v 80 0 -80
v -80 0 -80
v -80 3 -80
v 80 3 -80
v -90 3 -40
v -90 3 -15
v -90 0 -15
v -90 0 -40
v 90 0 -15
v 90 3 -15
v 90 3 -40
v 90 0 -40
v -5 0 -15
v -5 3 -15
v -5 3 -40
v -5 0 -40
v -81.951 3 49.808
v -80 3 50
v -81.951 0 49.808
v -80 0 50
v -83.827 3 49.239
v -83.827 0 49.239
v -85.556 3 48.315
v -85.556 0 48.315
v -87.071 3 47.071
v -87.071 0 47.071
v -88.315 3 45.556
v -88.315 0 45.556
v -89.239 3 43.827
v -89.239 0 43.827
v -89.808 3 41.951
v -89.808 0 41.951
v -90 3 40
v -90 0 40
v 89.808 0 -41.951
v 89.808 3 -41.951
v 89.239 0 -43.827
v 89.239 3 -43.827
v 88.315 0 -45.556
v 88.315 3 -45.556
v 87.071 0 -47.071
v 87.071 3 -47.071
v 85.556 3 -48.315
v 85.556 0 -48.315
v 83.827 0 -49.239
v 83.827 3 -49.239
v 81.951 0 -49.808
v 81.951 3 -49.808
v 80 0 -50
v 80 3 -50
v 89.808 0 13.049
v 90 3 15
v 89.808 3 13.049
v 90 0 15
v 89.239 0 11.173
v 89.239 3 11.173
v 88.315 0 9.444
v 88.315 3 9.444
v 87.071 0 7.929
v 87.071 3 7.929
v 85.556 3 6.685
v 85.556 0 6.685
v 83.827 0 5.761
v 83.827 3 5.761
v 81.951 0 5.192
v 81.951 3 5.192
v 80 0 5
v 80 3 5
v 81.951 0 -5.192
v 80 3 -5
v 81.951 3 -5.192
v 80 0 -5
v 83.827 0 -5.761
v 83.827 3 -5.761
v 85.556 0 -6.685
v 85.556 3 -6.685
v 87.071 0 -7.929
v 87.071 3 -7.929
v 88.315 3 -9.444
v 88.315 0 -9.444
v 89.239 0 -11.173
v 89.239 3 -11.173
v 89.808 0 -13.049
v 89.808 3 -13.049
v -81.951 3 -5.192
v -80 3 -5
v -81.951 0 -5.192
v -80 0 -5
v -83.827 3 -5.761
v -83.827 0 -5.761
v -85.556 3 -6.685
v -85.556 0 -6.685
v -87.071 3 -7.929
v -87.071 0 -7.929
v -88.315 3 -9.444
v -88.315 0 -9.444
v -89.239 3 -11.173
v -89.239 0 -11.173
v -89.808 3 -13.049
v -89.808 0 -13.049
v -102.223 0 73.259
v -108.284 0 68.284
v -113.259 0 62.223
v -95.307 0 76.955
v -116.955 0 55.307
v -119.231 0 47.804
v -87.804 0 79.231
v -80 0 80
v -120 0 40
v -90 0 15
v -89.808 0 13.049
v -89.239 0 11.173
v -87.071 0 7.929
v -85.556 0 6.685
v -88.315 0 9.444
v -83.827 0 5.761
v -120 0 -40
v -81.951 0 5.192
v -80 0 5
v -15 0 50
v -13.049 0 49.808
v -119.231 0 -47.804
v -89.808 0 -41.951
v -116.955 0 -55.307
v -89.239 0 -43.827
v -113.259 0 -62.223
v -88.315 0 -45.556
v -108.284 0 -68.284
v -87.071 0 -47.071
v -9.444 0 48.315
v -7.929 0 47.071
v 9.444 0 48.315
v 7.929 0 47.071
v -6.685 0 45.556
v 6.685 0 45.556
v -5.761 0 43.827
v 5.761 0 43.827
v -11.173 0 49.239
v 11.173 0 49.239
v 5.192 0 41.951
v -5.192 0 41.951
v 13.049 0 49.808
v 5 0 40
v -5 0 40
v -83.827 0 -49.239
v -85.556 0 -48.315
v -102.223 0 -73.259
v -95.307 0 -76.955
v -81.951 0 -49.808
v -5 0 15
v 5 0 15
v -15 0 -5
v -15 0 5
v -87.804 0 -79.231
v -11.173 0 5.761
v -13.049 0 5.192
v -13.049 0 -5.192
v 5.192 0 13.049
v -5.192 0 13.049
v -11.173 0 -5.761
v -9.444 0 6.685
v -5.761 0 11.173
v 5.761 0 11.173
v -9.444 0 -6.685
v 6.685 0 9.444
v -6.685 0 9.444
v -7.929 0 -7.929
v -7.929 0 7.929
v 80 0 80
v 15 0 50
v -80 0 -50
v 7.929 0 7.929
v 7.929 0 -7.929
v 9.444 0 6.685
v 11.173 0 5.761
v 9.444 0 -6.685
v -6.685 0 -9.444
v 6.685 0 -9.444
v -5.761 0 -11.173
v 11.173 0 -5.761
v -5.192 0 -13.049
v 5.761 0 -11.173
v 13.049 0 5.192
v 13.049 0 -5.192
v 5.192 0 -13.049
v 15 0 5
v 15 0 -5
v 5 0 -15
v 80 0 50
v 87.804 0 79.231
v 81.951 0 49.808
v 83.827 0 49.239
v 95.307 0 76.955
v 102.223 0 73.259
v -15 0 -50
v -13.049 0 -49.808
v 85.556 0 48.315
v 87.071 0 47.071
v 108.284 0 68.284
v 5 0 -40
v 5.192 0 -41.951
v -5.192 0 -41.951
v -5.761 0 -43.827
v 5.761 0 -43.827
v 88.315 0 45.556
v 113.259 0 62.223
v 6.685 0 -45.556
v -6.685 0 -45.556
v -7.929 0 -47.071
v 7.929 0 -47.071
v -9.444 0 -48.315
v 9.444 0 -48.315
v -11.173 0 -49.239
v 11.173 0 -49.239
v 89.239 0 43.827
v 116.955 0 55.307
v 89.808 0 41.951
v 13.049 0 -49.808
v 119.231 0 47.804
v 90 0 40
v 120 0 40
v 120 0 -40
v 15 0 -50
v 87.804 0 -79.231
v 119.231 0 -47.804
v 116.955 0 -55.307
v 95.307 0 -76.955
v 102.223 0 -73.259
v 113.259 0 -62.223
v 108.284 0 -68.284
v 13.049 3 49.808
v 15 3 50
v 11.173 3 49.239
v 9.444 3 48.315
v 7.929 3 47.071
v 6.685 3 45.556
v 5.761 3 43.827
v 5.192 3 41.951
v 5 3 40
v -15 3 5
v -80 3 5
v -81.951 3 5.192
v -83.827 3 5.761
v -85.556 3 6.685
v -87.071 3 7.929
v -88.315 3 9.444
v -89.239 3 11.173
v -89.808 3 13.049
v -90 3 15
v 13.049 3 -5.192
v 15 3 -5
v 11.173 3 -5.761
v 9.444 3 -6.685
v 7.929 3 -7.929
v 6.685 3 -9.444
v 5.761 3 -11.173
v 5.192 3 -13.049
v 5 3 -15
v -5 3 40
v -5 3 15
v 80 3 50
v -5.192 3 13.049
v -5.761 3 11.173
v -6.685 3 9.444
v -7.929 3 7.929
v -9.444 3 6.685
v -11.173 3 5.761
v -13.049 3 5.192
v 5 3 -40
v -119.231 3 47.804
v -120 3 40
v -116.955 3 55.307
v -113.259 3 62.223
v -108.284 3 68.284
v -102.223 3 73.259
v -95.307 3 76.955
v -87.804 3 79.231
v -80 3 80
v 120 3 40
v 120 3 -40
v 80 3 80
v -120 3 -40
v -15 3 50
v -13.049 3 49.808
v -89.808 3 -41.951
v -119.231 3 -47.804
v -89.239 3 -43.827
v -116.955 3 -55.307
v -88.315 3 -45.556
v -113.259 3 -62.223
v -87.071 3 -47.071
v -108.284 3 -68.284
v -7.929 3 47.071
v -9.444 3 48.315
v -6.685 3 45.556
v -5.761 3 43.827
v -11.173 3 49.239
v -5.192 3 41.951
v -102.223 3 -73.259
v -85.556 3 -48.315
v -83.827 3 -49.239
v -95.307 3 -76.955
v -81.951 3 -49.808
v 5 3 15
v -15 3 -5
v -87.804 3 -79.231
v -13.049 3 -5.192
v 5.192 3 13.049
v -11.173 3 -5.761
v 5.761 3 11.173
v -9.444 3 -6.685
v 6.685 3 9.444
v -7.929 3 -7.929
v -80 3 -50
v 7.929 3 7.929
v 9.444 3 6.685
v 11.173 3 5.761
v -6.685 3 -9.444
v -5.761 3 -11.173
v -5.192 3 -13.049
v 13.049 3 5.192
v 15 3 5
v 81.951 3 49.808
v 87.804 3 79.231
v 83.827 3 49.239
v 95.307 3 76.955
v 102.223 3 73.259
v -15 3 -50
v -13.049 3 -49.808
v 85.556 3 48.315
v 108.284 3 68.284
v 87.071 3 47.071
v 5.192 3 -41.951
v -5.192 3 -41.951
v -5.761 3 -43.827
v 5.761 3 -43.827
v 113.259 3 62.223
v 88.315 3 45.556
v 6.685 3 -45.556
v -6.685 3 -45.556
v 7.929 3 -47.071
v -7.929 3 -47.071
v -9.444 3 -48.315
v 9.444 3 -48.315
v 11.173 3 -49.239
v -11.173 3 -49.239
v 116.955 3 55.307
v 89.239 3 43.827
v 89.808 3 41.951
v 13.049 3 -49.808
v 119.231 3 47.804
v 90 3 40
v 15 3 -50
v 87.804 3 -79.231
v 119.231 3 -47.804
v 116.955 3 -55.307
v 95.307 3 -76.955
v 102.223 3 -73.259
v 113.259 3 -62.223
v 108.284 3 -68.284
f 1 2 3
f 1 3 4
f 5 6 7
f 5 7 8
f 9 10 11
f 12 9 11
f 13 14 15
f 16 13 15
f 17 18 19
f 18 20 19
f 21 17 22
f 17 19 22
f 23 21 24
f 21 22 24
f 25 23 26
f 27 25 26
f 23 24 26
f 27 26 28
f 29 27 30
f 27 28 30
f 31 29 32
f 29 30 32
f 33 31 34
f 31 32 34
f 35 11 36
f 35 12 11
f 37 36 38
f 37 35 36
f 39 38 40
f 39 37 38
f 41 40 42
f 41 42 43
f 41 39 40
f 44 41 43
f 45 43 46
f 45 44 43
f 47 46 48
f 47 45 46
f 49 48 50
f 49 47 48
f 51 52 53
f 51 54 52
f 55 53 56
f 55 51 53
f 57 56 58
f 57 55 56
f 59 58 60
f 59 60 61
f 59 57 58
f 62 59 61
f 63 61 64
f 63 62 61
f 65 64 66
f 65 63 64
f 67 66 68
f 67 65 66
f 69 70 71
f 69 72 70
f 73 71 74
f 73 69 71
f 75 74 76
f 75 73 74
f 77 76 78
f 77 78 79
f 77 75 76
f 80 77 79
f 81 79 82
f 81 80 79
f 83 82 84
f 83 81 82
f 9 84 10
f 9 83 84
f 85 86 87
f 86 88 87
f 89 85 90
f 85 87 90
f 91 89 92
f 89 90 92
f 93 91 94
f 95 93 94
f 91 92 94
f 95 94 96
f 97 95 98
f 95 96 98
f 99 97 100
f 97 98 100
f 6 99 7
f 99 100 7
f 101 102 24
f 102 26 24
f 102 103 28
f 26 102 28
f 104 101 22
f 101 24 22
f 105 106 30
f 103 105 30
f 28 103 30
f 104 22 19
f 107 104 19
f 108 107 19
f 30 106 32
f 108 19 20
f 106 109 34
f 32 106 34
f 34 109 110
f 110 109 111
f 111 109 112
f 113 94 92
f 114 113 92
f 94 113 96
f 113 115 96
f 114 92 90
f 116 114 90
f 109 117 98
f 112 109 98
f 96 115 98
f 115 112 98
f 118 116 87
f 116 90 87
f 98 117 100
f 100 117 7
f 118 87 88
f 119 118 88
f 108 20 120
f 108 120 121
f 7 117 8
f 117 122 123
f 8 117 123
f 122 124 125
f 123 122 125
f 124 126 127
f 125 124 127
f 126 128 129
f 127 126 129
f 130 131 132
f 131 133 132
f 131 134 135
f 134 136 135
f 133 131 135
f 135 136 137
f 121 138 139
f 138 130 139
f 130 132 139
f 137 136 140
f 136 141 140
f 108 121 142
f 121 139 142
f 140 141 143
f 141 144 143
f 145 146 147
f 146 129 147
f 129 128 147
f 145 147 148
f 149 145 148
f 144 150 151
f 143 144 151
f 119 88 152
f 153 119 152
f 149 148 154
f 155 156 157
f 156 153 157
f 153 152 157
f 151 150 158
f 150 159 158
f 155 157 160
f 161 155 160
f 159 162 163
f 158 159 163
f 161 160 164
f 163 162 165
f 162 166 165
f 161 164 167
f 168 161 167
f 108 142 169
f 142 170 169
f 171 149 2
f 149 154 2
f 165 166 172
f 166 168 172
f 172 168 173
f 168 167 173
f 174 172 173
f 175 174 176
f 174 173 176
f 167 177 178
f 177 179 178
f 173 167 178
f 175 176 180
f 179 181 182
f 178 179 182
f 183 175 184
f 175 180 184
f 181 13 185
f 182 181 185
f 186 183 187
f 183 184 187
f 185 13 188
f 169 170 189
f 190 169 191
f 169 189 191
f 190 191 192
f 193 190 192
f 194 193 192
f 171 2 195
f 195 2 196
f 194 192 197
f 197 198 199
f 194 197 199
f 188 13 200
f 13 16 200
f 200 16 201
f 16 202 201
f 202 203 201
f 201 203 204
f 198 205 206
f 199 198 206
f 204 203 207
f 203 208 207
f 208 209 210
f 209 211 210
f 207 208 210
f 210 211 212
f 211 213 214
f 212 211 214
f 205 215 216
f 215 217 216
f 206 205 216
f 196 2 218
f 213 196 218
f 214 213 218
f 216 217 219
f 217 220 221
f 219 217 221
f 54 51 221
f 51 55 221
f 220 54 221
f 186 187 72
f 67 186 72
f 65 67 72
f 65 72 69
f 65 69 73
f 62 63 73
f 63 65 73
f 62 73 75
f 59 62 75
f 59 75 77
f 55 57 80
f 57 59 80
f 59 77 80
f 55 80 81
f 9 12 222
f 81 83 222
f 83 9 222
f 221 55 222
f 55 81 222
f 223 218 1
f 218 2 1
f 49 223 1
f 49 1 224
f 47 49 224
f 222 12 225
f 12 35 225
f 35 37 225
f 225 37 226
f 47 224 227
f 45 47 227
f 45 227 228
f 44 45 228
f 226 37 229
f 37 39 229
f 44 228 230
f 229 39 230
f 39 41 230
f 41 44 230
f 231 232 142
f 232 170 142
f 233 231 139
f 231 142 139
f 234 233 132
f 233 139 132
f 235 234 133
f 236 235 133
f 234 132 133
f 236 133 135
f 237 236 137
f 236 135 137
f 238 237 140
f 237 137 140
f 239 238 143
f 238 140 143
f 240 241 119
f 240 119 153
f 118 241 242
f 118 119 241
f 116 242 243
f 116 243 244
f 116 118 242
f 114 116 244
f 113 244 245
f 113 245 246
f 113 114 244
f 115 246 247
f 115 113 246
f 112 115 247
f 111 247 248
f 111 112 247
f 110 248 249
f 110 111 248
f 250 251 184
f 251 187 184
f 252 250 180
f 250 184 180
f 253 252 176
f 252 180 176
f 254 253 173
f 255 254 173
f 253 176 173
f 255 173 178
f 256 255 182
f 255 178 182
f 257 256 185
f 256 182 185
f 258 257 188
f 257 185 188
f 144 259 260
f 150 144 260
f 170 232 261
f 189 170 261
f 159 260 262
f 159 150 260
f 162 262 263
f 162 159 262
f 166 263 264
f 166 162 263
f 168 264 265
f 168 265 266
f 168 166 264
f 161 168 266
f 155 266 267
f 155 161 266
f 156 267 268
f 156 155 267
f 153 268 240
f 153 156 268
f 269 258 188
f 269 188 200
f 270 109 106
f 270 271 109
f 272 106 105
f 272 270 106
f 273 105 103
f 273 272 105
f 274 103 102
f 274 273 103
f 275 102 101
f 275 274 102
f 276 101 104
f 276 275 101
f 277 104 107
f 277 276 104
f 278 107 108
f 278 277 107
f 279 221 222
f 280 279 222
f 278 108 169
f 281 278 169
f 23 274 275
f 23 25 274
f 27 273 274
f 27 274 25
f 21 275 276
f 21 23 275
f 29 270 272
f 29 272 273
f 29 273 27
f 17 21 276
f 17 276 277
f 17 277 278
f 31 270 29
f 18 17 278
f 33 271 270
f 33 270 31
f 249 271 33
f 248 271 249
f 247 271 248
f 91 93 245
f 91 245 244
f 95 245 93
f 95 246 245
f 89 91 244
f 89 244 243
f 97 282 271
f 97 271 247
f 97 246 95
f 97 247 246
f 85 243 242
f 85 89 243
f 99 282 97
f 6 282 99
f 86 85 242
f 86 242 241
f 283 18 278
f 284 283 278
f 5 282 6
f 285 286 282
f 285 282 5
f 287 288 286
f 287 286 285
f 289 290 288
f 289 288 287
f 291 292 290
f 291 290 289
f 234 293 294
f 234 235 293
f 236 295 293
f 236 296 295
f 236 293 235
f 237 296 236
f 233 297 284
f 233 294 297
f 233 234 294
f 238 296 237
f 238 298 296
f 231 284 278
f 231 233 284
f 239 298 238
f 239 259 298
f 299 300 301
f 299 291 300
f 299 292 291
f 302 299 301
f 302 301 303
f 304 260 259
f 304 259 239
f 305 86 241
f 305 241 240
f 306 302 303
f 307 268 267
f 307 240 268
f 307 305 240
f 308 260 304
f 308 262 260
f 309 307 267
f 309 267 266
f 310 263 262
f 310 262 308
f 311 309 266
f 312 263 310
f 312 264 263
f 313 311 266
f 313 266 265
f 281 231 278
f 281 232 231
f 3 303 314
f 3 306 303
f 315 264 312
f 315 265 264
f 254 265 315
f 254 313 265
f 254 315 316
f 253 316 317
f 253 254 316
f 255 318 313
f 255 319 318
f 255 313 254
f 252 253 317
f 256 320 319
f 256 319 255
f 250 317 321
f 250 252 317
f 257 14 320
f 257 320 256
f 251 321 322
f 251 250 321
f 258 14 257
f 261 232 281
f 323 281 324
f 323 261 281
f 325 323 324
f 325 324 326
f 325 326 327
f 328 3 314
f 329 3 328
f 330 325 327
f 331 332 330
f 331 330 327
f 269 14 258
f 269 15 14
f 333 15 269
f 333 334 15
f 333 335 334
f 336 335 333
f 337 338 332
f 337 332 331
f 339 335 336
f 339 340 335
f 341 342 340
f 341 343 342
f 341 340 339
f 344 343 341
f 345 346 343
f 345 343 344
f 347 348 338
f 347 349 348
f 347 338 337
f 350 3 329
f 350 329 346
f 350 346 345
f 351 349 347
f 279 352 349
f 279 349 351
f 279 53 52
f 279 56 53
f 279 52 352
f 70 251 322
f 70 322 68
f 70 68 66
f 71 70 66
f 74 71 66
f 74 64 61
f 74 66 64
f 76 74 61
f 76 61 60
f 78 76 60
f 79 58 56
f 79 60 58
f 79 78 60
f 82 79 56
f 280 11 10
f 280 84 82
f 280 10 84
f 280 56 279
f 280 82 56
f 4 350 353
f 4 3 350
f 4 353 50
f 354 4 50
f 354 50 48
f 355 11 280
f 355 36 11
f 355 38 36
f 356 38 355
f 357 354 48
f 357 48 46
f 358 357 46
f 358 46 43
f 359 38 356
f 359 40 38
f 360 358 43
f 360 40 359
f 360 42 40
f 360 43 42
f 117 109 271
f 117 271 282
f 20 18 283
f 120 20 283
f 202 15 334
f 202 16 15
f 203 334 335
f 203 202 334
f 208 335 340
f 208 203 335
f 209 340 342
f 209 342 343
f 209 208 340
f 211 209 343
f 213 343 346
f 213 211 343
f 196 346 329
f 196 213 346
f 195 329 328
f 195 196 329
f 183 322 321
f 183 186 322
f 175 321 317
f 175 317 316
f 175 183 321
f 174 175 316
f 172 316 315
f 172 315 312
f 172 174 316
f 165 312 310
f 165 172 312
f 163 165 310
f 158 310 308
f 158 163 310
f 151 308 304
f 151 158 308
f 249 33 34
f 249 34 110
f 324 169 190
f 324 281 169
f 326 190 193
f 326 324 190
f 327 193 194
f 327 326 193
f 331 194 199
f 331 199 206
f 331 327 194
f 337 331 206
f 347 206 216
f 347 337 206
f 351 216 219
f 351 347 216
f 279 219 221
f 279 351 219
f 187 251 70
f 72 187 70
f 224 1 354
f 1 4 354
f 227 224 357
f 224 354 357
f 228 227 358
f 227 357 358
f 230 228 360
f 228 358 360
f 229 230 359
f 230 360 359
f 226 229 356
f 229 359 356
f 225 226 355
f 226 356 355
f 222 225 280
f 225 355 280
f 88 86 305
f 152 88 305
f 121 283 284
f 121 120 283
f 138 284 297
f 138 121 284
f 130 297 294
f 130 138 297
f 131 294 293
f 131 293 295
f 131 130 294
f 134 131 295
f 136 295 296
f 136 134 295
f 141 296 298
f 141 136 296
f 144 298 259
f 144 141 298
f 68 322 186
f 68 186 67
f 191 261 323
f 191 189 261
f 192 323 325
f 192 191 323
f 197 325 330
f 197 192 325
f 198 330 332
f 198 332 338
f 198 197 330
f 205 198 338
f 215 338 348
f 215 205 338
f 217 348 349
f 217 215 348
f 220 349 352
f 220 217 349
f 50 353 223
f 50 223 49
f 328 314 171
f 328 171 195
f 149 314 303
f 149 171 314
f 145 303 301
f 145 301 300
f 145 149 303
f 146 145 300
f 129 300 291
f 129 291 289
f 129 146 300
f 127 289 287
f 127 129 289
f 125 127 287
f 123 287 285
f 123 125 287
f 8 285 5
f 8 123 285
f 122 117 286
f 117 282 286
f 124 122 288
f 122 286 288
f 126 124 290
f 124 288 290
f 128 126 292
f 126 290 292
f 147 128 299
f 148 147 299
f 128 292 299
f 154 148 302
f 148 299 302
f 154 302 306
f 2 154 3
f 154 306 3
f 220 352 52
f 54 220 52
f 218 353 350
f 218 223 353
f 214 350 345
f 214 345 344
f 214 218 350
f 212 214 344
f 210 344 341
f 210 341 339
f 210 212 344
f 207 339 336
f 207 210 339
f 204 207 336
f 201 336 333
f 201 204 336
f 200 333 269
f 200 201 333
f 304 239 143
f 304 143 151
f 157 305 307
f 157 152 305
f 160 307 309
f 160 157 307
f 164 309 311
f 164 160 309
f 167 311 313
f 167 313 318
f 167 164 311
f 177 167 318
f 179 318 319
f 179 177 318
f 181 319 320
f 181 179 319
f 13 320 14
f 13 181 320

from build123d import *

# Parameters (mm, degrees)
ESBO_O1_W                = 240
ESBO_O1_H                = 160
RESSALTO_EXTRUS_O1_DEPTH = 3
ESBO_O2_W                = 85
ESBO_O2_H                = 45
CORTE_EXTRUS_O1_DEPTH    = 145.25324953
FILETE1_R                = 40
FILETE2_R                = 10


with BuildPart() as part:
    # Esboço1 → Ressalto-extrusão1 (new body)
    with BuildSketch(Plane(origin=(0, 0, 0), x_dir=(1, 0, 0), z_dir=(0, 1, 0))):
        Rectangle(ESBO_O1_W, ESBO_O1_H)
    extrude(amount=RESSALTO_EXTRUS_O1_DEPTH)

    # Esboço2 → Corte-extrusão1 (cut, through all)
    with BuildSketch(Plane(origin=(0, 3, 0), x_dir=(1, 0, 0), z_dir=(0, 1, 0))):
        with Locations((-47.5, -27.5)):
            Rectangle(ESBO_O2_W, ESBO_O2_H)
        with Locations((47.5, 27.5)):
            Rectangle(ESBO_O2_W, ESBO_O2_H)
        with Locations((-47.5, 27.5)):
            Rectangle(ESBO_O2_W, ESBO_O2_H)
        with Locations((47.5, -27.5)):
            Rectangle(ESBO_O2_W, ESBO_O2_H)
    extrude(amount=-CORTE_EXTRUS_O1_DEPTH, mode=Mode.SUBTRACT)

    # Filete1
    filete1_edges = [part.edges().sort_by_distance(p)[0] for p in [
        (-120, 1.5, -80),
        (120, 1.5, -80),
        (120, 1.5, 80),
        (-120, 1.5, 80),
    ]]
    fillet(filete1_edges, radius=FILETE1_R)

    # Filete2
    filete2_edges = [part.edges().sort_by_distance(p)[0] for p in [
        (-90, 1.5, -5),
        (-90, 1.5, -50),
        (-5, 1.5, -50),
        (-5, 1.5, -5),
        (-90, 1.5, 5),
        (-5, 1.5, 5),
        (-5, 1.5, 50),
        (-90, 1.5, 50),
        (90, 1.5, 50),
        (5, 1.5, 50),
        (5, 1.5, 5),
        (90, 1.5, 5),
        (5, 1.5, -50),
        (90, 1.5, -50),
        (90, 1.5, -5),
        (5, 1.5, -5),
    ]]
    fillet(filete2_edges, radius=FILETE2_R)


solid = part.part
